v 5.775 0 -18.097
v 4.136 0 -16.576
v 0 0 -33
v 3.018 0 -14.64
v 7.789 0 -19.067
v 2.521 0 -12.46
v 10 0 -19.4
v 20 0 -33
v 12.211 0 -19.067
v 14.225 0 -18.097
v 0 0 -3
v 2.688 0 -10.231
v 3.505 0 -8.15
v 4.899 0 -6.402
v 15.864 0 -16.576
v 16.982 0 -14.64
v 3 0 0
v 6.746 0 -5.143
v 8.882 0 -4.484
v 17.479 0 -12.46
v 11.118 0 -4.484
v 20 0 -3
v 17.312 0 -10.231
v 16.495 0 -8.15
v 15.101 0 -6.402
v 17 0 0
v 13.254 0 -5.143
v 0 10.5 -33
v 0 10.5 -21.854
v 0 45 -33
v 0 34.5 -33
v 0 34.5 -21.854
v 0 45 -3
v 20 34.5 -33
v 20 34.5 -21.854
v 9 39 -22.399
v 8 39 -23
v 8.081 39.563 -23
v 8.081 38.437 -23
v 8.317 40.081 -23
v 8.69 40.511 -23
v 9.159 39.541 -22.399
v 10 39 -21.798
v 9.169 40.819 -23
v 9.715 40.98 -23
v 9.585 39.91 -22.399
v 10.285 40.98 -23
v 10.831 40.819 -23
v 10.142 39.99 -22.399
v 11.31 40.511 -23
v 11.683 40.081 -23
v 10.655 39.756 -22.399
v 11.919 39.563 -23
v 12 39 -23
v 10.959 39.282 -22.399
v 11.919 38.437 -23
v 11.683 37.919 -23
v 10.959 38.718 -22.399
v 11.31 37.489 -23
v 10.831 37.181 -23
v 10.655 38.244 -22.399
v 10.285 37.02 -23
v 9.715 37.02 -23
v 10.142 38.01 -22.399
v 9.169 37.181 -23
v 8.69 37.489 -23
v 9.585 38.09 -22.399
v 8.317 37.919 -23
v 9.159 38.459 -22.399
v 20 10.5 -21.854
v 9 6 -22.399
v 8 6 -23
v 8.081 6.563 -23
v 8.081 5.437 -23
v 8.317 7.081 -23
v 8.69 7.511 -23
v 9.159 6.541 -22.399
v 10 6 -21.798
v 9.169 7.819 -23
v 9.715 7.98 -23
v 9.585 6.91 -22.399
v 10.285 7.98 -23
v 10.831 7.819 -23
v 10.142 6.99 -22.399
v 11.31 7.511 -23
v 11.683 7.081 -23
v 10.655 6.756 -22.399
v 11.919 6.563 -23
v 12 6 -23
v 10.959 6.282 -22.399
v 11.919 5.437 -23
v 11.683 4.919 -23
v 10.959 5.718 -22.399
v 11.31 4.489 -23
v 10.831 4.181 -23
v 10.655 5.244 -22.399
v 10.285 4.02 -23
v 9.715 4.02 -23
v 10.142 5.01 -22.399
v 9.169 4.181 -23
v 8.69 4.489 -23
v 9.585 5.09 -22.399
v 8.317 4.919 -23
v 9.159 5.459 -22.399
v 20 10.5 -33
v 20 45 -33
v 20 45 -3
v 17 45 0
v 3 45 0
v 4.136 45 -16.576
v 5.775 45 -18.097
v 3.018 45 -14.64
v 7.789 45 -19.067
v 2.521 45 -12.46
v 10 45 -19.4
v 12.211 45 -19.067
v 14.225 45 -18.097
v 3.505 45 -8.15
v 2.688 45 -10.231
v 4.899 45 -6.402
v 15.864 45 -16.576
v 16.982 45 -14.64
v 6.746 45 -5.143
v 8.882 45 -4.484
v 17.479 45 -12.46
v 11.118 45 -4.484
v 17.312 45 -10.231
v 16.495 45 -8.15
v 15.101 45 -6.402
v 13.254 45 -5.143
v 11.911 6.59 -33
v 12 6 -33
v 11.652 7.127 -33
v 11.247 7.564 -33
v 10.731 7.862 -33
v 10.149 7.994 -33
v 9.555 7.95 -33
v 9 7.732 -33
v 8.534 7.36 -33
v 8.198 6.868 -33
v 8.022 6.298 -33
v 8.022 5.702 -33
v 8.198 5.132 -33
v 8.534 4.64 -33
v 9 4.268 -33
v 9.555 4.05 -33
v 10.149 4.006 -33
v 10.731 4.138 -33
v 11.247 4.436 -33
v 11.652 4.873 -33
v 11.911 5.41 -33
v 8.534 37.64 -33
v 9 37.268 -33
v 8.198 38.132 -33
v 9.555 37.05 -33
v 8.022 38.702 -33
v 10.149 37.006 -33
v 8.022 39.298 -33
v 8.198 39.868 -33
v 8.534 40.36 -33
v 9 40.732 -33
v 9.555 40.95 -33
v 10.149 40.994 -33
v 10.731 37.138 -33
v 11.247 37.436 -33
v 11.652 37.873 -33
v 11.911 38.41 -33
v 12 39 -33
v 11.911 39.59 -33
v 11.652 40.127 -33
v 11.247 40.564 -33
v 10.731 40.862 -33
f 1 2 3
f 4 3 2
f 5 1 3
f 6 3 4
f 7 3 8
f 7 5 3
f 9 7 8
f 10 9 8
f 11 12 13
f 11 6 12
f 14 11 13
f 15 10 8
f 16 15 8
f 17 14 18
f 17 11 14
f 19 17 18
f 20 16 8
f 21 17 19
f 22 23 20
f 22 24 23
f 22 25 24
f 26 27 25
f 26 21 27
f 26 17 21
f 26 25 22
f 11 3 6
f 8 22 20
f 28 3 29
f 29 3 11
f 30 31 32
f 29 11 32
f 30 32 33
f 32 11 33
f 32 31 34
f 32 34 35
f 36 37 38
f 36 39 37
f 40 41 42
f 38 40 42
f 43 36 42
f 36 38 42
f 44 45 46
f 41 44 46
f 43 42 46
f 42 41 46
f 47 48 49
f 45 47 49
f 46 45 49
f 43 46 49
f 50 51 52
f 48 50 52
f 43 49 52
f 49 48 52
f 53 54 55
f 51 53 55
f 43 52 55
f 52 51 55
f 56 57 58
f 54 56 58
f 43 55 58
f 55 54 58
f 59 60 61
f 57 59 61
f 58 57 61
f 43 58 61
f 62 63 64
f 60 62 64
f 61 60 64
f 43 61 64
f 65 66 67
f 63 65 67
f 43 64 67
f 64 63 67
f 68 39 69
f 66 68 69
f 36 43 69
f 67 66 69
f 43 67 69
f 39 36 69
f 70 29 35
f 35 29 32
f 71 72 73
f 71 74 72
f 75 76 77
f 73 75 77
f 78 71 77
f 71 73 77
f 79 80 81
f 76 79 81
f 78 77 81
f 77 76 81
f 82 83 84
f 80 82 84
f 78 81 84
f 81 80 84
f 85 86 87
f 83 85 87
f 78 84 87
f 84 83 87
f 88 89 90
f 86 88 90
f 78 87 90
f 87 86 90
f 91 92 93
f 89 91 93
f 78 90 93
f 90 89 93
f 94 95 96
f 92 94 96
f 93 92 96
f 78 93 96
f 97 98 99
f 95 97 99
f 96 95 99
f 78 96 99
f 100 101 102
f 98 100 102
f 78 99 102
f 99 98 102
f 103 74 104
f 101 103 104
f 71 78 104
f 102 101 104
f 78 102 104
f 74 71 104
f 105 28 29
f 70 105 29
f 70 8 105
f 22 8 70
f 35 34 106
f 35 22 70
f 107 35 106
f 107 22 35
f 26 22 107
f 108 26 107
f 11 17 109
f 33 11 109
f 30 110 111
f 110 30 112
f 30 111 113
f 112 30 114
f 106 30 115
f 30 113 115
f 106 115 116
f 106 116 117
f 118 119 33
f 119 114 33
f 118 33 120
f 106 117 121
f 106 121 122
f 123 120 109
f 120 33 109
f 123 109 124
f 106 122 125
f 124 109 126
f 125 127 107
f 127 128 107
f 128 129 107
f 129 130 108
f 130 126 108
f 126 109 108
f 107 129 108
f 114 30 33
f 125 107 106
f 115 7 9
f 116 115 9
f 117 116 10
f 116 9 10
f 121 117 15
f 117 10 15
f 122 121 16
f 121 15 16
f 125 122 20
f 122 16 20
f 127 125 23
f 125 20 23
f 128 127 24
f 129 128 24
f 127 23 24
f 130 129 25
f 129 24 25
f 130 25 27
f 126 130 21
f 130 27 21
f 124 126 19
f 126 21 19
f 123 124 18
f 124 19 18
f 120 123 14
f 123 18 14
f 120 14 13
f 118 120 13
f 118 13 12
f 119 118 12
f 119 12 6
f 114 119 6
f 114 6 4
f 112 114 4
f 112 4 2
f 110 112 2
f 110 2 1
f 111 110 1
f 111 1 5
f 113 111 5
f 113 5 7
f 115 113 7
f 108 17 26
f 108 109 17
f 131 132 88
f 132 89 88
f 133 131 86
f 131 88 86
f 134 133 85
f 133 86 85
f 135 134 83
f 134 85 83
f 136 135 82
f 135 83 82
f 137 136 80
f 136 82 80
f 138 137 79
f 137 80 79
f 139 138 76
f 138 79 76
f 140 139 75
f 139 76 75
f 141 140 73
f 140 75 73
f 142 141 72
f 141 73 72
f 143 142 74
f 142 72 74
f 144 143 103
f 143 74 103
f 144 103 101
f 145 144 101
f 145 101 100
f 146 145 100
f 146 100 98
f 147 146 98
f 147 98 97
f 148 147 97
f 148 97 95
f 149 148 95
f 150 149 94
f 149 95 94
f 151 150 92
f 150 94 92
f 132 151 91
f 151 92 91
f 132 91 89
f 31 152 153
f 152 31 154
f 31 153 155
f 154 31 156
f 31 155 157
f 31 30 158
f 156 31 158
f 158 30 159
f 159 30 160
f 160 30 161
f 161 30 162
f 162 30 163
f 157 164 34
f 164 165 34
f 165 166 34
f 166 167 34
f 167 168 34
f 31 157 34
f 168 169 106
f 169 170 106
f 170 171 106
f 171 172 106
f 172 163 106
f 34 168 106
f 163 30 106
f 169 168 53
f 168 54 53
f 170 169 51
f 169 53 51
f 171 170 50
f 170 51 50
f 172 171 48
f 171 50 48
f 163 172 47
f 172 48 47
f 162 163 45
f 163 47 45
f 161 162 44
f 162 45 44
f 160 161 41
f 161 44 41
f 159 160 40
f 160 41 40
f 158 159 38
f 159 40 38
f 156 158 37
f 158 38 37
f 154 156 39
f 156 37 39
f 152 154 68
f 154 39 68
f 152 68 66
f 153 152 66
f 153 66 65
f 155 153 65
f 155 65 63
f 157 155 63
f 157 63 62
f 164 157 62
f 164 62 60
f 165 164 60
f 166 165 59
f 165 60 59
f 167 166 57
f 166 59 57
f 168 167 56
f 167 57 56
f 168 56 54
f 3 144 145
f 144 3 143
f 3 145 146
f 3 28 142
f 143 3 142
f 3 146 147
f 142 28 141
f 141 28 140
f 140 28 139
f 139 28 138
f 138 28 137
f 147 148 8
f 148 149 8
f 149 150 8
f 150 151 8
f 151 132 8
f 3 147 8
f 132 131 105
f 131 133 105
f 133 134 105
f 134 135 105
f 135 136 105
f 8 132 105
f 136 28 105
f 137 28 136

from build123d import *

# Parameters (mm, degrees)
SCHIZZO1_W                   = 20
SCHIZZO1_H                   = 45
ESTRUSIONE_ESTRUSIONE1_DEPTH = 33
SCHIZZO2_R                   = 7.5
TAGLIO_ESTRUSIONE1_DEPTH     = 60.279001341
FORO_4_0_4_1_D               = 4
FORO_4_0_4_1_DEPTH           = 10
FORO_4_0_4_1_TIP             = 1.201721238
SMUSSO1_SIZE                 = 3
SCHIZZO7_W                   = 11.145993212
SCHIZZO7_H                   = 24
TAGLIO_ESTRUSIONE4_DEPTH     = 26


with BuildPart() as part:
    # Schizzo1 → Estrusione-Estrusione1 (new body)
    with BuildSketch(Plane.XY):
        with Locations((10, 22.5)):
            Rectangle(SCHIZZO1_W, SCHIZZO1_H)
    extrude(amount=-ESTRUSIONE_ESTRUSIONE1_DEPTH)

    # Schizzo2 → Taglio-Estrusione1 (cut, through all)
    with BuildSketch(Plane.XZ):
        with Locations((10, -11.9)):
            Circle(SCHIZZO2_R)
    extrude(amount=-TAGLIO_ESTRUSIONE1_DEPTH, mode=Mode.SUBTRACT)

    # Foro Ø4.0 (4)-1
    with Locations(Plane(origin=(10, 6, -33), x_dir=(-1, 0, 0), z_dir=(0, 0, -1))):
        with Locations((0, 0), (0, 33)):
            Hole(FORO_4_0_4_1_D / 2, depth=FORO_4_0_4_1_DEPTH)
            with Locations((0, 0, -(FORO_4_0_4_1_DEPTH + FORO_4_0_4_1_TIP / 2))):  # 118° drill point
                Cone(0, FORO_4_0_4_1_D / 2, FORO_4_0_4_1_TIP, mode=Mode.SUBTRACT)

    # Smusso1
    smusso1_edges = [part.edges().sort_by_distance(p)[0] for p in [
        (0, 22.5, 0),
        (20, 22.5, 0),
    ]]
    chamfer(smusso1_edges, length=SMUSSO1_SIZE)

    # Schizzo7 → Taglio-Estrusione4 (cut)
    with BuildSketch(Plane.ZY):
        with Locations((-27.427003394, 22.5)):
            Rectangle(SCHIZZO7_W, SCHIZZO7_H)
    extrude(amount=-TAGLIO_ESTRUSIONE4_DEPTH, mode=Mode.SUBTRACT)


solid = part.part
